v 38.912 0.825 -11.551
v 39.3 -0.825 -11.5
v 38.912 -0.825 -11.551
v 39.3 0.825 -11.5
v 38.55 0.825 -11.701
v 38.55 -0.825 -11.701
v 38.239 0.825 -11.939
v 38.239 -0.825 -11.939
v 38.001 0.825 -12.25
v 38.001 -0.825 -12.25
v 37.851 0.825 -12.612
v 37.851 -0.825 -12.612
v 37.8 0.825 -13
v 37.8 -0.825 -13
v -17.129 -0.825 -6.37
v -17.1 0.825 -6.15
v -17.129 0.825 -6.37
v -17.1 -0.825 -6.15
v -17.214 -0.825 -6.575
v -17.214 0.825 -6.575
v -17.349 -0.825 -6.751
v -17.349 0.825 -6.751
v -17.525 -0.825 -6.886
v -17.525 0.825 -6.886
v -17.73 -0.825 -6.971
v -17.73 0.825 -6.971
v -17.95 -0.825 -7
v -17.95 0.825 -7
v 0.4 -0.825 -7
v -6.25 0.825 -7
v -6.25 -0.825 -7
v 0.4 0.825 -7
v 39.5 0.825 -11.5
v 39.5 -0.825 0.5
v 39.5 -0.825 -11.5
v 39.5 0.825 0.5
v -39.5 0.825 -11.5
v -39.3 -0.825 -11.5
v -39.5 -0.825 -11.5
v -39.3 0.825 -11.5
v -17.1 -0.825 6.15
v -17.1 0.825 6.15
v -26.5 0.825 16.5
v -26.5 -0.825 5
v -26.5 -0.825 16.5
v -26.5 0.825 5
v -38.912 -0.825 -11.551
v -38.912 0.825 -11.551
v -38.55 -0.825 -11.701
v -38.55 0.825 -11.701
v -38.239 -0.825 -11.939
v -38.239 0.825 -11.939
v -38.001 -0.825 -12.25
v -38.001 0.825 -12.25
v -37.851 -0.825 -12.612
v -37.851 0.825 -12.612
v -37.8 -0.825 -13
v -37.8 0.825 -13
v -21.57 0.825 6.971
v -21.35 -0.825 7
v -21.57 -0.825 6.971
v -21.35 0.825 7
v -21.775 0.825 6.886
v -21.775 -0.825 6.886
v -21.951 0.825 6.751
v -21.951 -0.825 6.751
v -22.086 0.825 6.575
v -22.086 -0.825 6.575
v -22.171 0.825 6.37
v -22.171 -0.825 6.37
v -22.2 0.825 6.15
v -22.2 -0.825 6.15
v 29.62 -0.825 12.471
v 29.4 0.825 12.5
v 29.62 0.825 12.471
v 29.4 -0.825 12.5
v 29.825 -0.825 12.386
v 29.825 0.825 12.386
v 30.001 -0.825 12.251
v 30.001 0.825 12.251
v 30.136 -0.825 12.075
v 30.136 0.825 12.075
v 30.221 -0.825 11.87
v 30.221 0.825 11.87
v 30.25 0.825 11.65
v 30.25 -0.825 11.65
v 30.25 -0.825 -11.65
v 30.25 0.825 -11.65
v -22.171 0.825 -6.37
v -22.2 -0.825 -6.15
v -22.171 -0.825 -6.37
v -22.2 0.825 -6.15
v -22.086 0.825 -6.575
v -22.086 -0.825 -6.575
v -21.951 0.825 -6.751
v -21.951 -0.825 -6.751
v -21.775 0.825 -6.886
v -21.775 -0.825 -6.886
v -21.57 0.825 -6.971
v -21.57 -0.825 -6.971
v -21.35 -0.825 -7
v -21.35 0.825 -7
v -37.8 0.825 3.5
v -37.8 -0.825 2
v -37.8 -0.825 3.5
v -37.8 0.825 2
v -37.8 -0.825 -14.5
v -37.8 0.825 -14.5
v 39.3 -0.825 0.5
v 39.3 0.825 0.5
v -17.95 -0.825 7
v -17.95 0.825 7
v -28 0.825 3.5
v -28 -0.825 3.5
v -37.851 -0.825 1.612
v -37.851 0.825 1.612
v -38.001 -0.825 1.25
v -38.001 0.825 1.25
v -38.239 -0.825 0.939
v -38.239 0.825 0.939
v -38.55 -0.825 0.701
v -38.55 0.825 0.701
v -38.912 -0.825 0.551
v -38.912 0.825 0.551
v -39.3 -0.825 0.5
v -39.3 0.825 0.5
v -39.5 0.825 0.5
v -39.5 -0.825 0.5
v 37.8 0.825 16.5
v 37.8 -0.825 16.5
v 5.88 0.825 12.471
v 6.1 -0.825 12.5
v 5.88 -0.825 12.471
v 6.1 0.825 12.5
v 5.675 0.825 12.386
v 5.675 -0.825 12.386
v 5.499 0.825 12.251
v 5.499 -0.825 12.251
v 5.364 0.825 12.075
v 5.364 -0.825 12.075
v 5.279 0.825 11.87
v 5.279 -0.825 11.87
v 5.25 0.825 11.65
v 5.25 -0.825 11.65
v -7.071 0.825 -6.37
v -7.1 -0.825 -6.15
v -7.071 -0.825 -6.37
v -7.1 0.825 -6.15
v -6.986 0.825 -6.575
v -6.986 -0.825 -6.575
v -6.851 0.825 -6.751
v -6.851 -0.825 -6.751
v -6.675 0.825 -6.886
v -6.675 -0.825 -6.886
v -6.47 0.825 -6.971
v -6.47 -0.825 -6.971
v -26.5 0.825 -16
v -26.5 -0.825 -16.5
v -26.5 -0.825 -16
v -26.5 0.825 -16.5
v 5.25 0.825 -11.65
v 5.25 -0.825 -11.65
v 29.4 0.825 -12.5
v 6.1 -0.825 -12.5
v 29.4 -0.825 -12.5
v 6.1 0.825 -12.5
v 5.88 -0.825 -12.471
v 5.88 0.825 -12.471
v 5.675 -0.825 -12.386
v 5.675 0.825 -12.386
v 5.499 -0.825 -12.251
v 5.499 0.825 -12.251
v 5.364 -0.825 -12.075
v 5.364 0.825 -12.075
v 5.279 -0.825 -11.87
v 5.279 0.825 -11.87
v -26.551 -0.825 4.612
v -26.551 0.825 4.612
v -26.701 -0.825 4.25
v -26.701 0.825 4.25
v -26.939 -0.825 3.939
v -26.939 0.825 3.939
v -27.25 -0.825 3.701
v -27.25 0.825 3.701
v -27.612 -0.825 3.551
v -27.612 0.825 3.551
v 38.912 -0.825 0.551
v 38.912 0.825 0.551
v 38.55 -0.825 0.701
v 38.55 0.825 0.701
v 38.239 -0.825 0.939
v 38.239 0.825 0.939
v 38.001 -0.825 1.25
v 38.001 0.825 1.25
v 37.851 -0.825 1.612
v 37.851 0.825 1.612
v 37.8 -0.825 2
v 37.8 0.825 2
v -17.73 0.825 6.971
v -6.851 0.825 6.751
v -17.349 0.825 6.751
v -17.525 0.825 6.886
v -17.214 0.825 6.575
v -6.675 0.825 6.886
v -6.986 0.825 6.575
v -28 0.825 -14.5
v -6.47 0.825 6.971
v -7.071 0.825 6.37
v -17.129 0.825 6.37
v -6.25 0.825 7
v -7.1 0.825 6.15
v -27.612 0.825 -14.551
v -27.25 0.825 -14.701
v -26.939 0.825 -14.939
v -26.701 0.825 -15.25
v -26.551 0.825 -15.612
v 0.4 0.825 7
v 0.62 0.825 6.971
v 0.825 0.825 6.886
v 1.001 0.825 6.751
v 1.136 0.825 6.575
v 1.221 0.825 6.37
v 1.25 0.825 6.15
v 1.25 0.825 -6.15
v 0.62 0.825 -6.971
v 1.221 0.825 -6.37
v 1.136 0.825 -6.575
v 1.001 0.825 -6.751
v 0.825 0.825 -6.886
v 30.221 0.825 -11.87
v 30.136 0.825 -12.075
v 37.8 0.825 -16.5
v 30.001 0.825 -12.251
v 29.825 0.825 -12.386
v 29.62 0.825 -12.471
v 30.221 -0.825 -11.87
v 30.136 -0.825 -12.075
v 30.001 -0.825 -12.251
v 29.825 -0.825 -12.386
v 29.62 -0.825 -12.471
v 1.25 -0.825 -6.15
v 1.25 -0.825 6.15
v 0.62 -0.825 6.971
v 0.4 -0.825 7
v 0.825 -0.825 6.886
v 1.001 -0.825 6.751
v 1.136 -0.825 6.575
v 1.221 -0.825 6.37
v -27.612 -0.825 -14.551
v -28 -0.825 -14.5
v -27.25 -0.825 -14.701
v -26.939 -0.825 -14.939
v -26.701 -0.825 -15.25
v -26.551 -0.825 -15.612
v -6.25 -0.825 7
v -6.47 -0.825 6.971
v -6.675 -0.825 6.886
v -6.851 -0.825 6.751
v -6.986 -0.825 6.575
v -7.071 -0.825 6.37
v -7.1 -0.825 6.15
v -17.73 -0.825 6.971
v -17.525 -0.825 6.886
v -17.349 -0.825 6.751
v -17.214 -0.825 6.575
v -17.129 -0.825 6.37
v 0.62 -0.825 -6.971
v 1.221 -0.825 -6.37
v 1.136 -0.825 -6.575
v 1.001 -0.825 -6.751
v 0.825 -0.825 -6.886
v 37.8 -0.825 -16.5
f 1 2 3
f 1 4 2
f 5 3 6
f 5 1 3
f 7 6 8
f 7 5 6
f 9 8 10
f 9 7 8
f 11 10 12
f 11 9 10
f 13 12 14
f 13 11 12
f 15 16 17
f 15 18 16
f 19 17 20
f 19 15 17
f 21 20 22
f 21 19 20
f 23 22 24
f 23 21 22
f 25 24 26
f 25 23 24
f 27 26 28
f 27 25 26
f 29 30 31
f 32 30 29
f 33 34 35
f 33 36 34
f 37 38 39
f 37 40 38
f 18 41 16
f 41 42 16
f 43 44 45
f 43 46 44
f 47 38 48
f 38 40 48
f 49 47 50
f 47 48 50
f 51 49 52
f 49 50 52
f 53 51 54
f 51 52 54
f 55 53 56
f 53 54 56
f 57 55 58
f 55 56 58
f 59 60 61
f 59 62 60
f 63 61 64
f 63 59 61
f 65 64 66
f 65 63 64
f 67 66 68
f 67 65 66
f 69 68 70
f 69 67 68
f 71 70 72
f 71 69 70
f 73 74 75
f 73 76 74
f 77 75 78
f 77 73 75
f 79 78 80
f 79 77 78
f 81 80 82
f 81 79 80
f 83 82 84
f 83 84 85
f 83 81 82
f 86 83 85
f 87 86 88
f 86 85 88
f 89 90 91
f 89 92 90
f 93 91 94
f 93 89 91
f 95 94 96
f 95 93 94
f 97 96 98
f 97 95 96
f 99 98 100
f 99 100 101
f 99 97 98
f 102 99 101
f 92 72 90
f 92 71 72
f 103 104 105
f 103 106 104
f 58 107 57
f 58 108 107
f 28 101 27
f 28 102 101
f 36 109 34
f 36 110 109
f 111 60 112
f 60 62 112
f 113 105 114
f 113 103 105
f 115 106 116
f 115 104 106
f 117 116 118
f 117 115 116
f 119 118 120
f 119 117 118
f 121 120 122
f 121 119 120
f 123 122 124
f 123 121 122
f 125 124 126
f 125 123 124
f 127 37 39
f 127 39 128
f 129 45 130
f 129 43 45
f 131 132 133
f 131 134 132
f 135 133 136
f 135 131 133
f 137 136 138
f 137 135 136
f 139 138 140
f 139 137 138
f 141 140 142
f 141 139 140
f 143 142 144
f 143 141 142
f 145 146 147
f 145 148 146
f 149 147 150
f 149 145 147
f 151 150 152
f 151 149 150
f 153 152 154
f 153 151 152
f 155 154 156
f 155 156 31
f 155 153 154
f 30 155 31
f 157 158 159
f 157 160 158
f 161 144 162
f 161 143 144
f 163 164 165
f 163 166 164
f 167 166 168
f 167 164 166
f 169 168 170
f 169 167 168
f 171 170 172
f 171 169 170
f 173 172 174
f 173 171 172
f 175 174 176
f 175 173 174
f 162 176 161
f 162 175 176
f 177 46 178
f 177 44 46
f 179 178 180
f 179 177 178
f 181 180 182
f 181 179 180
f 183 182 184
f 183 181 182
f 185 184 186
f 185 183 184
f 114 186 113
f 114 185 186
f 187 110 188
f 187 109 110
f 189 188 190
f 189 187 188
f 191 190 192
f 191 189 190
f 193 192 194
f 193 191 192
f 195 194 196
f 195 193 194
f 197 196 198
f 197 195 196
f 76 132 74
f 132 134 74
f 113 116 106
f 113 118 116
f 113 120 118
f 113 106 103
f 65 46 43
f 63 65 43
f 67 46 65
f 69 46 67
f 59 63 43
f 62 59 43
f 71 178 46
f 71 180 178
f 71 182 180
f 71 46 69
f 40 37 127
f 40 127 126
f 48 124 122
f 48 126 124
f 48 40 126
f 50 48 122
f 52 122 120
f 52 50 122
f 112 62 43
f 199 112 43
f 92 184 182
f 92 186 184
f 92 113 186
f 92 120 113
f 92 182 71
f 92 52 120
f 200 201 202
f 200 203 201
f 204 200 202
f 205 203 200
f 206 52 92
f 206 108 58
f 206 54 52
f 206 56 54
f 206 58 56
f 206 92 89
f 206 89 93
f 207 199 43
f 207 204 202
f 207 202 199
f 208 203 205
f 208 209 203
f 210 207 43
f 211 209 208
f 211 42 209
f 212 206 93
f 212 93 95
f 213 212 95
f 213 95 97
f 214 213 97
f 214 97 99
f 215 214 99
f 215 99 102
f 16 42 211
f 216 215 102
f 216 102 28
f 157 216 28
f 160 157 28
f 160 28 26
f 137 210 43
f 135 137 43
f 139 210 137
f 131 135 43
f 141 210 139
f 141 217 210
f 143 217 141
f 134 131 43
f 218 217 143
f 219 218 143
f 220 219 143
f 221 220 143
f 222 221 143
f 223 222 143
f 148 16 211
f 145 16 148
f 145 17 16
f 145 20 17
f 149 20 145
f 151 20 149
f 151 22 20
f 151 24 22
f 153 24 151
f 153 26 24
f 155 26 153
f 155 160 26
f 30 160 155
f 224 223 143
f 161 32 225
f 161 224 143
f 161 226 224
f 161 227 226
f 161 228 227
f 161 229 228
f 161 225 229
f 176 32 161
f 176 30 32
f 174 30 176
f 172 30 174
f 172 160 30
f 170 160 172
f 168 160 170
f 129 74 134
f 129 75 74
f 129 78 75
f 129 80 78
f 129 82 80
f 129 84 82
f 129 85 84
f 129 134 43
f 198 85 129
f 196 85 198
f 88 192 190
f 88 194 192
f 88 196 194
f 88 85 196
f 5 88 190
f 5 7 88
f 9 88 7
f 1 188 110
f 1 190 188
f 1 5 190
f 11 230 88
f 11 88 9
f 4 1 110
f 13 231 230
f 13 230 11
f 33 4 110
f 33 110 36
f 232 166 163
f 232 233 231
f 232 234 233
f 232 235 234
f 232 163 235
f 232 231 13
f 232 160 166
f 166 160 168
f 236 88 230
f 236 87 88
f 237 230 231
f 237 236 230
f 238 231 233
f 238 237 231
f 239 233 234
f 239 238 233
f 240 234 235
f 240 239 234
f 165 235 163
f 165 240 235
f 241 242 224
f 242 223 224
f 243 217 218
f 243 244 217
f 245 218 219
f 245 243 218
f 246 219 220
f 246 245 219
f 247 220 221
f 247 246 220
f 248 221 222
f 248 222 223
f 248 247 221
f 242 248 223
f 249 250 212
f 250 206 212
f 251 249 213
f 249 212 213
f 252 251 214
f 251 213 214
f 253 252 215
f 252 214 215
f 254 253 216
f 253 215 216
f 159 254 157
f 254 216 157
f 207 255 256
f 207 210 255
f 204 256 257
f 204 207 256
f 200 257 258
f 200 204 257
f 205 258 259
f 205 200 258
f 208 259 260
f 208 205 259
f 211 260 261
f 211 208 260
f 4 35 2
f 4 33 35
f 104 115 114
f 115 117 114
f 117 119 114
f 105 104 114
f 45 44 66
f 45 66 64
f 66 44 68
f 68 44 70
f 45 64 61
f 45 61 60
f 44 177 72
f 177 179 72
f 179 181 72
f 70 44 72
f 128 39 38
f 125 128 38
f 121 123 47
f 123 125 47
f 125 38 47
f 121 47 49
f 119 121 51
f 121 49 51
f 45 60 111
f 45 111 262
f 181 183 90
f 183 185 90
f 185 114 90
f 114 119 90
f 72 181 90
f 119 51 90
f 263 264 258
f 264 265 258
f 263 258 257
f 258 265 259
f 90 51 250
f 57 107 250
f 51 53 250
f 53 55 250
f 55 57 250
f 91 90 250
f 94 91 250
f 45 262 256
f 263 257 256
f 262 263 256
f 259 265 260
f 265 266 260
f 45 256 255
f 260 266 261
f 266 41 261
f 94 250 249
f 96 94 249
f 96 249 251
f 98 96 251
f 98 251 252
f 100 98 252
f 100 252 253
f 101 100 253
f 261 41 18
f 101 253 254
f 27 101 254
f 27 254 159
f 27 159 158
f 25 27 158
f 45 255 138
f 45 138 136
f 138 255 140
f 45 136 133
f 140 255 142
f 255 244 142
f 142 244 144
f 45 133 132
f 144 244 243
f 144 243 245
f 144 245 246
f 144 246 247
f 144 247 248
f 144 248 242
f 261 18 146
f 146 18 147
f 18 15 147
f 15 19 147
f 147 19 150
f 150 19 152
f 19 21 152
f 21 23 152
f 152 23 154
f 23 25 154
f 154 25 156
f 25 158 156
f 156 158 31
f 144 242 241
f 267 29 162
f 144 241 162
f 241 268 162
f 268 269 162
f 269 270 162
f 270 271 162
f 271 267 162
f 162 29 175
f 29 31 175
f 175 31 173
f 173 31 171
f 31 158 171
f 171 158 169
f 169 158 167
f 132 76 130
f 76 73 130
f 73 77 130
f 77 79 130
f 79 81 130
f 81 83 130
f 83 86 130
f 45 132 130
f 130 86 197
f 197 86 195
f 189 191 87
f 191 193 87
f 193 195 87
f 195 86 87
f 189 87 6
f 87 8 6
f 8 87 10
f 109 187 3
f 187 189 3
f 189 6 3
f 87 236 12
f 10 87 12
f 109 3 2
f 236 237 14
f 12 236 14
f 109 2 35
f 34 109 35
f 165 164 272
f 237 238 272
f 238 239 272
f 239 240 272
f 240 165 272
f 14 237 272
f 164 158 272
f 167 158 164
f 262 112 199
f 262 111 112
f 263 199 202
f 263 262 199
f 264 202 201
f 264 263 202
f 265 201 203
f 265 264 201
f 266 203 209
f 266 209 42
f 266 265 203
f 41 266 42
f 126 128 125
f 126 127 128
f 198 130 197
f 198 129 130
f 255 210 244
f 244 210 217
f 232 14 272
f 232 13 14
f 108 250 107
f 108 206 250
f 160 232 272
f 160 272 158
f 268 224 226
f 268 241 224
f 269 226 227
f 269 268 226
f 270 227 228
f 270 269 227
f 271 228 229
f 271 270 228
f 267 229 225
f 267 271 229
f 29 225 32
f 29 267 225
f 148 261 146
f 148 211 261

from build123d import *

# Parameters (mm, degrees)
SKIZZE1_W                       = 5.1
SKIZZE1_H                       = 14
SKIZZE1_W_2                     = 8.35
SKIZZE1_W_3                     = 25
SKIZZE1_H_2                     = 25
AUFSATZ_LINEAR_AUSTRAGEN1_DEPTH = 0.825
VERRUNDUNG1_R                   = 1.5
VERRUNDUNG2_R                   = 0.85


with BuildPart() as part:
    # Skizze1 → Aufsatz-Linear austragen1 (new body, symmetric)
    with BuildSketch(Plane(origin=(0, 0, 0), x_dir=(1, 0, 0), z_dir=(0, 1, 0))):
        Polygon((37.8, 11.5), (37.8, 16.5), (-26.5, 16.5), (-26.5, 14.5), (-26.5, -3.5), (-26.5, -16.5), (37.8, -16.5), (37.8, -0.5), (39.5, -0.5), (39.5, 11.5), align=None)
        with Locations((-19.65, 0)):
            Rectangle(SKIZZE1_W, SKIZZE1_H, mode=Mode.SUBTRACT)
        with Locations((-2.925, 0)):
            Rectangle(SKIZZE1_W_2, SKIZZE1_H, mode=Mode.SUBTRACT)
        with Locations((17.75, 0)):
            Rectangle(SKIZZE1_W_3, SKIZZE1_H_2, mode=Mode.SUBTRACT)
        Polygon((-26.5, -3.5), (-26.5, 14.5), (-37.8, 14.5), (-37.8, 11.5), (-39.5, 11.5), (-39.5, -0.5), (-37.8, -0.5), (-37.8, -3.5), align=None)
    extrude(amount=AUFSATZ_LINEAR_AUSTRAGEN1_DEPTH, both=True)

    # Verrundung1
    verrundung1_edges = [part.edges().sort_by_distance(p)[0] for p in [
        (37.8, 0, -11.5),
        (37.8, 0, 0.5),
        (-26.5, 0, 3.5),
        (-37.8, 0, 0.5),
        (-37.8, 0, -11.5),
        (-26.5, 0, -14.5),
    ]]
    fillet(verrundung1_edges, radius=VERRUNDUNG1_R)

    # Verrundung2
    verrundung2_edges = [part.edges().sort_by_distance(p)[0] for p in [
        (-7.1, 0, -7),
        (-7.1, 0, 7),
        (1.25, 0, 7),
        (1.25, 0, -7),
        (5.25, 0, -12.5),
        (5.25, 0, 12.5),
        (30.25, 0, 12.5),
        (30.25, 0, -12.5),
        (-17.1, 0, 7),
        (-17.1, 0, -7),
        (-22.2, 0, -7),
        (-22.2, 0, 7),
    ]]
    fillet(verrundung2_edges, radius=VERRUNDUNG2_R)


solid = part.part
